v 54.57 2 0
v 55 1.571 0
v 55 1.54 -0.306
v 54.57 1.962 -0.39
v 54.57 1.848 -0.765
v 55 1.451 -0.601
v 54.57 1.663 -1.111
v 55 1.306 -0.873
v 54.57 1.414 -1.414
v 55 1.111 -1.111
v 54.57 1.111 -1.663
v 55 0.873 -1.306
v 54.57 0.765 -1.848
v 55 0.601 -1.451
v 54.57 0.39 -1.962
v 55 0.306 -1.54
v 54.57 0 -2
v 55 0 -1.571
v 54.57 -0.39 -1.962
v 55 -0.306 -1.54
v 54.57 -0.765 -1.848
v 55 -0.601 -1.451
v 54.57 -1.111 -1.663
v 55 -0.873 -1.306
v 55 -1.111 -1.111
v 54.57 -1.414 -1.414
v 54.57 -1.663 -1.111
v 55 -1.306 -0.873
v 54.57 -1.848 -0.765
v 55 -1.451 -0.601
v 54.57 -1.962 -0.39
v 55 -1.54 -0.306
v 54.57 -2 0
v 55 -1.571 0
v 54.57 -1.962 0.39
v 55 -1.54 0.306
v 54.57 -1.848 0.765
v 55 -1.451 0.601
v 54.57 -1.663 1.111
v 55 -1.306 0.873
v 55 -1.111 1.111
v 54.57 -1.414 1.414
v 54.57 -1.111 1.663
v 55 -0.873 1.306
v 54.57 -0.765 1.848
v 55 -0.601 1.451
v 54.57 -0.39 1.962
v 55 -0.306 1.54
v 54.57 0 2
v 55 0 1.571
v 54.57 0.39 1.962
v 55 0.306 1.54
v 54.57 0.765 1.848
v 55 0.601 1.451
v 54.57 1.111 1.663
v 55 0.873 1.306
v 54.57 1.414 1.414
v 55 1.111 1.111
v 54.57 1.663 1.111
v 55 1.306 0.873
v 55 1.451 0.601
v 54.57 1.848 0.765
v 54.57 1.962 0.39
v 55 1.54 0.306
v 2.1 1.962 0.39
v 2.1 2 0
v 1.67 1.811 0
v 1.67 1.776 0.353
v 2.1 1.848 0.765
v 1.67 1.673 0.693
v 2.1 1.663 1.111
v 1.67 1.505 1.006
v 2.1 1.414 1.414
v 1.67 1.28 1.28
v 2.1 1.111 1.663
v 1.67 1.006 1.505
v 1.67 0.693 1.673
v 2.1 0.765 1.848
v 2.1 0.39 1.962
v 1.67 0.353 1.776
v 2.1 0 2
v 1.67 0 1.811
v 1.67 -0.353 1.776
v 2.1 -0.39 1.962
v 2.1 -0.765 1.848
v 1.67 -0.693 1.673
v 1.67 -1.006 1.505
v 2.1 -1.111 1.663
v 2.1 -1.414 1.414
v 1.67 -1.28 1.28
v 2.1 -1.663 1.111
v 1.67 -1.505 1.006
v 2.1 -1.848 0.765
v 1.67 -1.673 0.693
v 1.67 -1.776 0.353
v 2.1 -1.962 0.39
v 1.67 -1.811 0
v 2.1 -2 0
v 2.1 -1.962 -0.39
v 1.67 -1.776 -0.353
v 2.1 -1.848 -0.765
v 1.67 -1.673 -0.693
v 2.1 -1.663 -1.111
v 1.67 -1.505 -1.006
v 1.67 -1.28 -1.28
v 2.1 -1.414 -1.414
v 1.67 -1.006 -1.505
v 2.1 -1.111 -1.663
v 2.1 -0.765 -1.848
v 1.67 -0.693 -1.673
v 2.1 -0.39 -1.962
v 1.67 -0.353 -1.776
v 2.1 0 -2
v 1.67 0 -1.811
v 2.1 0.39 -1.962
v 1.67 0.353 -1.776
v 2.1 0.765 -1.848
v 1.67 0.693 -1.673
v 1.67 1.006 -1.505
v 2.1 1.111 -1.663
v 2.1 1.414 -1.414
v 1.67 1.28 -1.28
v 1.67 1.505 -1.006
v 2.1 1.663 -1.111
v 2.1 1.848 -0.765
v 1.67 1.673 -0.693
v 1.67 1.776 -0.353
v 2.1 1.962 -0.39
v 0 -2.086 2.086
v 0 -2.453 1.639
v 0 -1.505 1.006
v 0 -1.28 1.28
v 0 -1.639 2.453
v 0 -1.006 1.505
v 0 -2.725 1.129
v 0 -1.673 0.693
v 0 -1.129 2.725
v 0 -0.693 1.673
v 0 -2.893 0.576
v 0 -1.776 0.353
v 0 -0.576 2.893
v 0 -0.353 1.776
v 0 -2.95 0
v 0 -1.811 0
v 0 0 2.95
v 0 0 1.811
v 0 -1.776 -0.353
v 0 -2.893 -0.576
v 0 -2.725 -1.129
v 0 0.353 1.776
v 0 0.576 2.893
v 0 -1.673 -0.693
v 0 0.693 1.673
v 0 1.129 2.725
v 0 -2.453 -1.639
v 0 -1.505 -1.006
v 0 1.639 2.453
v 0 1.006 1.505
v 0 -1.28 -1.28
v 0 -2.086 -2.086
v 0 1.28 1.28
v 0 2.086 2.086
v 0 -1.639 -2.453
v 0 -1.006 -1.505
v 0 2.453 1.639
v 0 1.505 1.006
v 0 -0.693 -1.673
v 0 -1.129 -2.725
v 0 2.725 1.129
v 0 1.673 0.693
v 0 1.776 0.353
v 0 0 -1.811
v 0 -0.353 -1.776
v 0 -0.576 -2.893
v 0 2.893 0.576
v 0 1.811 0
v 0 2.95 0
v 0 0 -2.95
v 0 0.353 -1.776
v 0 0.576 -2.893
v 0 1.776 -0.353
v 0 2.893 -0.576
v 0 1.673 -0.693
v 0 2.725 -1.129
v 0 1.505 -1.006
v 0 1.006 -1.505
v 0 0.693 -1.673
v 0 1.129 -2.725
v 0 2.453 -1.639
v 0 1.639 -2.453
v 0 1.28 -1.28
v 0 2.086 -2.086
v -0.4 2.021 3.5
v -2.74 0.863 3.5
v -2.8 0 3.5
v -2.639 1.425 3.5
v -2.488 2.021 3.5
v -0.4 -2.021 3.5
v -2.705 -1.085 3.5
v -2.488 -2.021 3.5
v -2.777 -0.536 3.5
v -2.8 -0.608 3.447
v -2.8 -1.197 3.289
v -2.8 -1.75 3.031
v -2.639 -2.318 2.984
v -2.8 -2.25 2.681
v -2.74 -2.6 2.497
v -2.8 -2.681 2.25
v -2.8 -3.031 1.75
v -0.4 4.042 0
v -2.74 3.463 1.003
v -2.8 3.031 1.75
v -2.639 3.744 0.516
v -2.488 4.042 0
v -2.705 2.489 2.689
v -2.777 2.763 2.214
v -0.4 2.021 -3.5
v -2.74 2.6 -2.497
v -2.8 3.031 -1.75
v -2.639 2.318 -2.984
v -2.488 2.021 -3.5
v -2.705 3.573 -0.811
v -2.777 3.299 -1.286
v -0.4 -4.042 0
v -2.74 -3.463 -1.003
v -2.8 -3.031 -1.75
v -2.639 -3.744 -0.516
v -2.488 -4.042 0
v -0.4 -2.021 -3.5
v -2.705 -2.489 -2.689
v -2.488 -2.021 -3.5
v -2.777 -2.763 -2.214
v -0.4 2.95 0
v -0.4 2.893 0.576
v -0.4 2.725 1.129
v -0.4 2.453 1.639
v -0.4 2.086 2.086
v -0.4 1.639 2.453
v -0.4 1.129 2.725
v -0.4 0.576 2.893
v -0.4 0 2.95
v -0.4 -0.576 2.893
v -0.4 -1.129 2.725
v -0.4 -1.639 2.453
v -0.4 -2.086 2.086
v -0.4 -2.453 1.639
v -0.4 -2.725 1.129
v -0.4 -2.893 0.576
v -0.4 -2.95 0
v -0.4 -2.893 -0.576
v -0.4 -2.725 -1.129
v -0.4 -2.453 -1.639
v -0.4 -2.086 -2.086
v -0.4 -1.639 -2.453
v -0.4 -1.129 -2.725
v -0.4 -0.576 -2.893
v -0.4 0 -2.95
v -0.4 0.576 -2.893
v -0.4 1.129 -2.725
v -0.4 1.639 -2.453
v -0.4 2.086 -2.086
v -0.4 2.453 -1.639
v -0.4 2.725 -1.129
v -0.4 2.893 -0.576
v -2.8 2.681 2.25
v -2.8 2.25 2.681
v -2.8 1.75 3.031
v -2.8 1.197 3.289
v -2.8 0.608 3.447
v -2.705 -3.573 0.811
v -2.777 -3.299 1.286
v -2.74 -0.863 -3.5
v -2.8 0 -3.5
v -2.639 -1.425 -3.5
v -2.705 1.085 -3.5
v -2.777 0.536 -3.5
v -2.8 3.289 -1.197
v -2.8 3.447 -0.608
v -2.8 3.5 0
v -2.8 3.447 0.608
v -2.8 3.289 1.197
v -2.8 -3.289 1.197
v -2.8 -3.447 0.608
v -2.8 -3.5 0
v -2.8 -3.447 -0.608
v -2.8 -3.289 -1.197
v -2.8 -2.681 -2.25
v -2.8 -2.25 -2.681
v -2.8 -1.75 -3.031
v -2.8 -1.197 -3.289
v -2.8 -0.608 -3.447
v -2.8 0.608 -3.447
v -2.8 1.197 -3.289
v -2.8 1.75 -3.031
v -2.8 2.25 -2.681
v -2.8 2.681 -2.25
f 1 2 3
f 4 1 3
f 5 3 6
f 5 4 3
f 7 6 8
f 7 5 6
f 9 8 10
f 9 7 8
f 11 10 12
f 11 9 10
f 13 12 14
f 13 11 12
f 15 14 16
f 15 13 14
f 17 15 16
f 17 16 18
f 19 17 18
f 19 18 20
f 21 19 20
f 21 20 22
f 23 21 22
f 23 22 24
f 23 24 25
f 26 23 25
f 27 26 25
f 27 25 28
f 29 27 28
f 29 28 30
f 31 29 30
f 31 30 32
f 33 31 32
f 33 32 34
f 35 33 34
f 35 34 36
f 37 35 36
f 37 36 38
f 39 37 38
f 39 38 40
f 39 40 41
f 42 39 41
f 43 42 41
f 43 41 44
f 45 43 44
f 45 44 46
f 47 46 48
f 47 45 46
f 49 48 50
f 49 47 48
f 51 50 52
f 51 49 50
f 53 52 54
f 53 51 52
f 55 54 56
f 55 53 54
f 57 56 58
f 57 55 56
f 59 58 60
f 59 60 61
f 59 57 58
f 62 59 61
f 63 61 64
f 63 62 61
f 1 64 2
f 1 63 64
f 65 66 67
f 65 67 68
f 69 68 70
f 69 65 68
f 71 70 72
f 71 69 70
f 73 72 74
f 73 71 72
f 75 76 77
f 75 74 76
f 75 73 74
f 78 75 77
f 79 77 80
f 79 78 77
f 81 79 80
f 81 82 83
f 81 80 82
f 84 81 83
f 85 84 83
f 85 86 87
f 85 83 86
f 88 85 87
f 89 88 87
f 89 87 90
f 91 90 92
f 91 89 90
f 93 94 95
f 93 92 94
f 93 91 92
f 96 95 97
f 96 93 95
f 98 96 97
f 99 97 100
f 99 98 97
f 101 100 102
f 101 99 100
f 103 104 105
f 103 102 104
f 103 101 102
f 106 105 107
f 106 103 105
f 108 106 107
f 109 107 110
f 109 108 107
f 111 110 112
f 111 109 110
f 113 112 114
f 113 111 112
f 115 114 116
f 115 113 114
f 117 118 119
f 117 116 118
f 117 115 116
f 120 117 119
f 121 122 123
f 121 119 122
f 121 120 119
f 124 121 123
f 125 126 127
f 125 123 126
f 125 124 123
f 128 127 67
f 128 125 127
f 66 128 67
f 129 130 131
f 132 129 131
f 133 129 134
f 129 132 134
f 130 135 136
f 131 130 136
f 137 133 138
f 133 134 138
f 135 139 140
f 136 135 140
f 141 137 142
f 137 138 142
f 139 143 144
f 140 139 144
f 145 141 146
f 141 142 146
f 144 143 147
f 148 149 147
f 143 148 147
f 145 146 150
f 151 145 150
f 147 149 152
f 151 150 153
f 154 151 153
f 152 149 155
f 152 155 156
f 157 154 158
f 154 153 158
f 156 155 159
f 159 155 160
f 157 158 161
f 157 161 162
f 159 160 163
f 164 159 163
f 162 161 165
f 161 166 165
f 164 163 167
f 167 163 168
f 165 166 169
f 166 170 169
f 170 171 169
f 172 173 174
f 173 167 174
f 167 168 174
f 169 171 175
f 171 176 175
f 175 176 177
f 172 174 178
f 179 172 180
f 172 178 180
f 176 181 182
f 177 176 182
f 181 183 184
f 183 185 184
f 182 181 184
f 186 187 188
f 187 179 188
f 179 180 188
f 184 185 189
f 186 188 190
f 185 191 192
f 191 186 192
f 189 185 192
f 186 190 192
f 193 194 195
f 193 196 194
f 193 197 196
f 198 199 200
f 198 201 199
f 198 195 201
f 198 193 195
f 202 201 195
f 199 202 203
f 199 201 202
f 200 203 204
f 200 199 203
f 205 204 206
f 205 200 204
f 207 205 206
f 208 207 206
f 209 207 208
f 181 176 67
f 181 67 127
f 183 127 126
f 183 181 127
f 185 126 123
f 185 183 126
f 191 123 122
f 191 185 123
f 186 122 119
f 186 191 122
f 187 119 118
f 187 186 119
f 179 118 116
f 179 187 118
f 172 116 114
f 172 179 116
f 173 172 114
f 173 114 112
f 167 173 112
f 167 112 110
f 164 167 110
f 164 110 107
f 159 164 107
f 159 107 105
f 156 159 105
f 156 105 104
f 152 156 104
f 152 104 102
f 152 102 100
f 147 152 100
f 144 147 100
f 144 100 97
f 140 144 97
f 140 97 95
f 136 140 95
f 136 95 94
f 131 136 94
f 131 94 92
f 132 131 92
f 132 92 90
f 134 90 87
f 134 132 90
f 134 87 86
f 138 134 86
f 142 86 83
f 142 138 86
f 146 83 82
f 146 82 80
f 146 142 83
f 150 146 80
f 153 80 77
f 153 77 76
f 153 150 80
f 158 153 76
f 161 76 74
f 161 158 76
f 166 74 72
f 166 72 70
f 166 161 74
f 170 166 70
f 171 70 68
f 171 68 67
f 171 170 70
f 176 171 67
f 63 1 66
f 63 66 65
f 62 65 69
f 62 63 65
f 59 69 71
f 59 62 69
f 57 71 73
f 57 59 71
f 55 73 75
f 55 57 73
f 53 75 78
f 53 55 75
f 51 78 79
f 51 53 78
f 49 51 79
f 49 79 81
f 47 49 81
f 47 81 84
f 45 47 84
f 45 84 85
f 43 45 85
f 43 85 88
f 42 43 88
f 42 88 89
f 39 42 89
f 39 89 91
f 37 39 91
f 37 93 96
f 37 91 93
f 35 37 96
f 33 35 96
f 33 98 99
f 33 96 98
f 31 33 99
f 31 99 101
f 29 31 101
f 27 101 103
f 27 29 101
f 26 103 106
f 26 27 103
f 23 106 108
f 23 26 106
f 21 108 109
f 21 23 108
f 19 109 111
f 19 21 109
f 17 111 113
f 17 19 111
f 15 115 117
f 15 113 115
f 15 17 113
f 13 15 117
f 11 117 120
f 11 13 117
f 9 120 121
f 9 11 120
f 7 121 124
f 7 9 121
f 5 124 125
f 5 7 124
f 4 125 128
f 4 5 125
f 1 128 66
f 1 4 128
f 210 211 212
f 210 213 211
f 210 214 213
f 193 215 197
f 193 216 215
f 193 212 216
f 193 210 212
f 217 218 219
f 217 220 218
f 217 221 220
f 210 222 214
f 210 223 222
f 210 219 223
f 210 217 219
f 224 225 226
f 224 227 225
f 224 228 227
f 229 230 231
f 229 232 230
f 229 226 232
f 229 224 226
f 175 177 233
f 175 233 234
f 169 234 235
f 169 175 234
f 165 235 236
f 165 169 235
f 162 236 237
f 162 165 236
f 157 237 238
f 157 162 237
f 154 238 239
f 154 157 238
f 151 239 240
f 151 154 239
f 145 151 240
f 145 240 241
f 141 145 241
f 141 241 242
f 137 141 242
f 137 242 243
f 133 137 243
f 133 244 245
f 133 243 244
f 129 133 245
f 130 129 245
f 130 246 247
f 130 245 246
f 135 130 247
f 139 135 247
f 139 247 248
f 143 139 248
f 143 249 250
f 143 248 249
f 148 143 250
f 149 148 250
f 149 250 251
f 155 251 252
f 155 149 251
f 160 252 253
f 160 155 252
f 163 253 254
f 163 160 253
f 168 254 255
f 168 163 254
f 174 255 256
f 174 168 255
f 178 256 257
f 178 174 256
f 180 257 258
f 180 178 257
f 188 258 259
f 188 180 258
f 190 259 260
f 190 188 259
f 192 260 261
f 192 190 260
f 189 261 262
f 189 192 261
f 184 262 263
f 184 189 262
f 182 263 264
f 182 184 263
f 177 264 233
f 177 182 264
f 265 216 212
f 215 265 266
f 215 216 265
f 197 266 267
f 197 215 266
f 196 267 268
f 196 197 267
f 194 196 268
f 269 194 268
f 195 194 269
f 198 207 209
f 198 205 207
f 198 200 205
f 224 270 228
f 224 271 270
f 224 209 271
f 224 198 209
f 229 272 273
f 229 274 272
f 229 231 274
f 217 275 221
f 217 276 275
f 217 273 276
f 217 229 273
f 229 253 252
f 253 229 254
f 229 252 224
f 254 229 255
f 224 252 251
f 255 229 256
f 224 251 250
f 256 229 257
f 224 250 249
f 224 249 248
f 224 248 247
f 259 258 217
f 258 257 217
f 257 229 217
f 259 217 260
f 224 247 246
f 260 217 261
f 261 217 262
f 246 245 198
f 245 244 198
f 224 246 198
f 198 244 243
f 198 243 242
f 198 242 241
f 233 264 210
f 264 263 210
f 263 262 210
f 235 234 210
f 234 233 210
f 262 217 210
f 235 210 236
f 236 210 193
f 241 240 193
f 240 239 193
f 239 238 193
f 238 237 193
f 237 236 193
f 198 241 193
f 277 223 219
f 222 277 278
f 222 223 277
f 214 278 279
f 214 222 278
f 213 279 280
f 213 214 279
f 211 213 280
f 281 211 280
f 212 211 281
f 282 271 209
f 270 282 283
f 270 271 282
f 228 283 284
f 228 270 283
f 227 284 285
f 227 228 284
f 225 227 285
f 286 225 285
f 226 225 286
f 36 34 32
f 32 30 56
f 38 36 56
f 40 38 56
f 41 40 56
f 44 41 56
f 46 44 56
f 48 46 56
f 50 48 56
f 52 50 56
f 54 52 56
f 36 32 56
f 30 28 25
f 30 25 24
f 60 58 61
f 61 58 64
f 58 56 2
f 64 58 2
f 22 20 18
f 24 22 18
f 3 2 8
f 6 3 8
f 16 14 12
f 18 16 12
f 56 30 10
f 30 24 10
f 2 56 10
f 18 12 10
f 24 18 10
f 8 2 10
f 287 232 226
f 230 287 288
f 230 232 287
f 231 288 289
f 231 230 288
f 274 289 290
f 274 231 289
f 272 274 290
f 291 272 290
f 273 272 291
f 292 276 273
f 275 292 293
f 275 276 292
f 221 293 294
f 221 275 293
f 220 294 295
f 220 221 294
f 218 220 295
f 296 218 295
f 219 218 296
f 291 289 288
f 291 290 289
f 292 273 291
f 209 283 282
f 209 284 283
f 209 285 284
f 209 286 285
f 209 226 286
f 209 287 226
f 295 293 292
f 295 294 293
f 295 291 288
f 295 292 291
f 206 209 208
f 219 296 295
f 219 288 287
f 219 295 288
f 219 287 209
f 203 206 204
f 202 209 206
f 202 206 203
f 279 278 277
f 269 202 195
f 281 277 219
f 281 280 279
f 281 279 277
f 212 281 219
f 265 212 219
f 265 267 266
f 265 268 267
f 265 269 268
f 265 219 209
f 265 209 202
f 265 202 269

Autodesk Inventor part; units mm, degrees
ref_plane "YZ Plane" through (0, 0, 0) normal (1, 0, 0) x (0, 1, 0)
ref_plane "XZ Plane" through (0, 0, 0) normal (0, 1, 0) x (-1, 0, 0)
sketch "Skizze1" plane through (0, 0, 0) normal (0, 0, 1) x (1, 0, 0)
  line L0 (0, 2.95) -> (0, 1.8106)
  line L1 (2.1, 2) -> (55, 2)
  line L2 (55, 2) -> (55, 0)
  line L3 (55, 0) -> (-0.4001, 0)
  line L4 (-11.4801, 0) -> (66.08, 0) projected
  line L5 (-0.4001, 0) -> (-0.4001, 2.95)
  line L6 (-0.4001, 2.95) -> (0, 2.95)
  line L7 (2.1, 2) -> (1.6705, 1.8106)
  line L8 (1.6705, 1.8106) -> (0, 1.8106)
  line L9 (0, -0.59) -> (0, 3.54) projected
  dimension "d0" = 55
  dimension "d1" = 52.9
  dimension "d2" = 4
  dimension "d9" = 0.4001
  dimension "d10" = 5.9
  dimension "d13" = 0.4295
  dimension "d14" = 3.6211
revolve "Körper" add sketch "Skizze1" angle 360 about axis through (55, 0, 0) along (-1, 0, 0)
sketch "Skizze2" plane through (-0.4001, 0, 0) normal (-1, 0, 0) x (0, 0, 1)
  line L0 (0, 4.0415) -> (3.5, 2.0207)
  line L1 (3.5, 2.0207) -> (3.5, -2.0207)
  line L2 (3.5, -2.0207) -> (0, -4.0415)
  line L3 (0, -4.0415) -> (-3.5, -2.0207)
  line L4 (-3.5, -2.0207) -> (-3.5, 2.0207)
  line L5 (-3.5, 2.0207) -> (0, 4.0415)
  point P0 (0, 0)
  point P1 (0, 0)
  dimension "d11" = 7
extrude "Kopf" add sketch "Skizze2" along normal blind 2.4
sketch "Skizze4" plane through (0, 0, 0) normal (0, 0, 1) x (1, 0, 0)
  line L0 (-2.8001, 3.5) -> (-2.8001, 4.0415)
  line L1 (-2.8001, 4.0415) -> (-2.4875, 4.0415)
  line L2 (-2.4875, 4.0415) -> (-2.8001, 3.5)
  line L3 (-3.2801, 0) -> (0.0799, 0) projected
  line L4 (-0.4001, 4.0415) -> (-2.8001, 4.0415) projected
  line L5 (-2.8001, 2.0207) -> (-2.8001, 4.0415) projected
  dimension "d5" = 30
  dimension "d19" = 7
revolve "Fase1" cut sketch "Skizze4" angle 360 about axis through (-10, 0, 0) along (1, 0, 0)
thread "Gewinde" size "M4x0.7" class "6g" standard "ISO Metric profile" length 52.9
chamfer "Fase2" distance 0.4294 distance2 0.4295 1 edges at (55, -2, 0) measured on face at (55, -0.499, 0.4421)
ref_plane "Work Plane1" through (1.525, 0, 0) normal (0, 0, 1) x (1, 0, 0)
equation "\"d0\" = NLG"
equation "\"d1\" = GEL"
equation "\"d2\" = GD"
equation "\"d10\" = SD2"
equation "\"d14\" = BDM"
equation "\"d11\" = SW"
equation "\"d3\" = KOH - SD"
equation "\"d5\" = ANG1"
equation "\"d19\" = SW0"
equation "\"d15\" = GEL"
equation "\"d6\" = -0.5 * SPD + 0.5 * GD"
equation "\"NLG\" = 55"
equation "\"GD\" = NND"
equation "\"BDM\" = 3.62111"
equation "\"KOH\" = 2.8"
equation "\"GEL\" = 52.9"
equation "\"SW\" = 7"
equation "\"SW0\" = 7"
equation "\"SPD\" = NND - 1.2269 * PTC"
equation "\"SD2\" = 5.9"
equation "\"SD\" = 0.4"
equation "\"ANG1\" = 30deg"
equation "\"GAL\" = 0.61345 * PTC"
equation "\"GUL\" = 0.61345 * PTC"
equation "\"RR\" = 0.2"
equation "\"GD1\" = THREADDIA - 1.2269 * PTC"
equation "\"THREADDIA\" = 4"
equation "\"TOA\" = 30deg"
equation "\"PTC\" = 0.7"
equation "\"NND\" = 4"
equation "\"E0\" = 1.155 * SW"
properties part number "DIN 933 - M4  x 55" material "Stahl, weich"
